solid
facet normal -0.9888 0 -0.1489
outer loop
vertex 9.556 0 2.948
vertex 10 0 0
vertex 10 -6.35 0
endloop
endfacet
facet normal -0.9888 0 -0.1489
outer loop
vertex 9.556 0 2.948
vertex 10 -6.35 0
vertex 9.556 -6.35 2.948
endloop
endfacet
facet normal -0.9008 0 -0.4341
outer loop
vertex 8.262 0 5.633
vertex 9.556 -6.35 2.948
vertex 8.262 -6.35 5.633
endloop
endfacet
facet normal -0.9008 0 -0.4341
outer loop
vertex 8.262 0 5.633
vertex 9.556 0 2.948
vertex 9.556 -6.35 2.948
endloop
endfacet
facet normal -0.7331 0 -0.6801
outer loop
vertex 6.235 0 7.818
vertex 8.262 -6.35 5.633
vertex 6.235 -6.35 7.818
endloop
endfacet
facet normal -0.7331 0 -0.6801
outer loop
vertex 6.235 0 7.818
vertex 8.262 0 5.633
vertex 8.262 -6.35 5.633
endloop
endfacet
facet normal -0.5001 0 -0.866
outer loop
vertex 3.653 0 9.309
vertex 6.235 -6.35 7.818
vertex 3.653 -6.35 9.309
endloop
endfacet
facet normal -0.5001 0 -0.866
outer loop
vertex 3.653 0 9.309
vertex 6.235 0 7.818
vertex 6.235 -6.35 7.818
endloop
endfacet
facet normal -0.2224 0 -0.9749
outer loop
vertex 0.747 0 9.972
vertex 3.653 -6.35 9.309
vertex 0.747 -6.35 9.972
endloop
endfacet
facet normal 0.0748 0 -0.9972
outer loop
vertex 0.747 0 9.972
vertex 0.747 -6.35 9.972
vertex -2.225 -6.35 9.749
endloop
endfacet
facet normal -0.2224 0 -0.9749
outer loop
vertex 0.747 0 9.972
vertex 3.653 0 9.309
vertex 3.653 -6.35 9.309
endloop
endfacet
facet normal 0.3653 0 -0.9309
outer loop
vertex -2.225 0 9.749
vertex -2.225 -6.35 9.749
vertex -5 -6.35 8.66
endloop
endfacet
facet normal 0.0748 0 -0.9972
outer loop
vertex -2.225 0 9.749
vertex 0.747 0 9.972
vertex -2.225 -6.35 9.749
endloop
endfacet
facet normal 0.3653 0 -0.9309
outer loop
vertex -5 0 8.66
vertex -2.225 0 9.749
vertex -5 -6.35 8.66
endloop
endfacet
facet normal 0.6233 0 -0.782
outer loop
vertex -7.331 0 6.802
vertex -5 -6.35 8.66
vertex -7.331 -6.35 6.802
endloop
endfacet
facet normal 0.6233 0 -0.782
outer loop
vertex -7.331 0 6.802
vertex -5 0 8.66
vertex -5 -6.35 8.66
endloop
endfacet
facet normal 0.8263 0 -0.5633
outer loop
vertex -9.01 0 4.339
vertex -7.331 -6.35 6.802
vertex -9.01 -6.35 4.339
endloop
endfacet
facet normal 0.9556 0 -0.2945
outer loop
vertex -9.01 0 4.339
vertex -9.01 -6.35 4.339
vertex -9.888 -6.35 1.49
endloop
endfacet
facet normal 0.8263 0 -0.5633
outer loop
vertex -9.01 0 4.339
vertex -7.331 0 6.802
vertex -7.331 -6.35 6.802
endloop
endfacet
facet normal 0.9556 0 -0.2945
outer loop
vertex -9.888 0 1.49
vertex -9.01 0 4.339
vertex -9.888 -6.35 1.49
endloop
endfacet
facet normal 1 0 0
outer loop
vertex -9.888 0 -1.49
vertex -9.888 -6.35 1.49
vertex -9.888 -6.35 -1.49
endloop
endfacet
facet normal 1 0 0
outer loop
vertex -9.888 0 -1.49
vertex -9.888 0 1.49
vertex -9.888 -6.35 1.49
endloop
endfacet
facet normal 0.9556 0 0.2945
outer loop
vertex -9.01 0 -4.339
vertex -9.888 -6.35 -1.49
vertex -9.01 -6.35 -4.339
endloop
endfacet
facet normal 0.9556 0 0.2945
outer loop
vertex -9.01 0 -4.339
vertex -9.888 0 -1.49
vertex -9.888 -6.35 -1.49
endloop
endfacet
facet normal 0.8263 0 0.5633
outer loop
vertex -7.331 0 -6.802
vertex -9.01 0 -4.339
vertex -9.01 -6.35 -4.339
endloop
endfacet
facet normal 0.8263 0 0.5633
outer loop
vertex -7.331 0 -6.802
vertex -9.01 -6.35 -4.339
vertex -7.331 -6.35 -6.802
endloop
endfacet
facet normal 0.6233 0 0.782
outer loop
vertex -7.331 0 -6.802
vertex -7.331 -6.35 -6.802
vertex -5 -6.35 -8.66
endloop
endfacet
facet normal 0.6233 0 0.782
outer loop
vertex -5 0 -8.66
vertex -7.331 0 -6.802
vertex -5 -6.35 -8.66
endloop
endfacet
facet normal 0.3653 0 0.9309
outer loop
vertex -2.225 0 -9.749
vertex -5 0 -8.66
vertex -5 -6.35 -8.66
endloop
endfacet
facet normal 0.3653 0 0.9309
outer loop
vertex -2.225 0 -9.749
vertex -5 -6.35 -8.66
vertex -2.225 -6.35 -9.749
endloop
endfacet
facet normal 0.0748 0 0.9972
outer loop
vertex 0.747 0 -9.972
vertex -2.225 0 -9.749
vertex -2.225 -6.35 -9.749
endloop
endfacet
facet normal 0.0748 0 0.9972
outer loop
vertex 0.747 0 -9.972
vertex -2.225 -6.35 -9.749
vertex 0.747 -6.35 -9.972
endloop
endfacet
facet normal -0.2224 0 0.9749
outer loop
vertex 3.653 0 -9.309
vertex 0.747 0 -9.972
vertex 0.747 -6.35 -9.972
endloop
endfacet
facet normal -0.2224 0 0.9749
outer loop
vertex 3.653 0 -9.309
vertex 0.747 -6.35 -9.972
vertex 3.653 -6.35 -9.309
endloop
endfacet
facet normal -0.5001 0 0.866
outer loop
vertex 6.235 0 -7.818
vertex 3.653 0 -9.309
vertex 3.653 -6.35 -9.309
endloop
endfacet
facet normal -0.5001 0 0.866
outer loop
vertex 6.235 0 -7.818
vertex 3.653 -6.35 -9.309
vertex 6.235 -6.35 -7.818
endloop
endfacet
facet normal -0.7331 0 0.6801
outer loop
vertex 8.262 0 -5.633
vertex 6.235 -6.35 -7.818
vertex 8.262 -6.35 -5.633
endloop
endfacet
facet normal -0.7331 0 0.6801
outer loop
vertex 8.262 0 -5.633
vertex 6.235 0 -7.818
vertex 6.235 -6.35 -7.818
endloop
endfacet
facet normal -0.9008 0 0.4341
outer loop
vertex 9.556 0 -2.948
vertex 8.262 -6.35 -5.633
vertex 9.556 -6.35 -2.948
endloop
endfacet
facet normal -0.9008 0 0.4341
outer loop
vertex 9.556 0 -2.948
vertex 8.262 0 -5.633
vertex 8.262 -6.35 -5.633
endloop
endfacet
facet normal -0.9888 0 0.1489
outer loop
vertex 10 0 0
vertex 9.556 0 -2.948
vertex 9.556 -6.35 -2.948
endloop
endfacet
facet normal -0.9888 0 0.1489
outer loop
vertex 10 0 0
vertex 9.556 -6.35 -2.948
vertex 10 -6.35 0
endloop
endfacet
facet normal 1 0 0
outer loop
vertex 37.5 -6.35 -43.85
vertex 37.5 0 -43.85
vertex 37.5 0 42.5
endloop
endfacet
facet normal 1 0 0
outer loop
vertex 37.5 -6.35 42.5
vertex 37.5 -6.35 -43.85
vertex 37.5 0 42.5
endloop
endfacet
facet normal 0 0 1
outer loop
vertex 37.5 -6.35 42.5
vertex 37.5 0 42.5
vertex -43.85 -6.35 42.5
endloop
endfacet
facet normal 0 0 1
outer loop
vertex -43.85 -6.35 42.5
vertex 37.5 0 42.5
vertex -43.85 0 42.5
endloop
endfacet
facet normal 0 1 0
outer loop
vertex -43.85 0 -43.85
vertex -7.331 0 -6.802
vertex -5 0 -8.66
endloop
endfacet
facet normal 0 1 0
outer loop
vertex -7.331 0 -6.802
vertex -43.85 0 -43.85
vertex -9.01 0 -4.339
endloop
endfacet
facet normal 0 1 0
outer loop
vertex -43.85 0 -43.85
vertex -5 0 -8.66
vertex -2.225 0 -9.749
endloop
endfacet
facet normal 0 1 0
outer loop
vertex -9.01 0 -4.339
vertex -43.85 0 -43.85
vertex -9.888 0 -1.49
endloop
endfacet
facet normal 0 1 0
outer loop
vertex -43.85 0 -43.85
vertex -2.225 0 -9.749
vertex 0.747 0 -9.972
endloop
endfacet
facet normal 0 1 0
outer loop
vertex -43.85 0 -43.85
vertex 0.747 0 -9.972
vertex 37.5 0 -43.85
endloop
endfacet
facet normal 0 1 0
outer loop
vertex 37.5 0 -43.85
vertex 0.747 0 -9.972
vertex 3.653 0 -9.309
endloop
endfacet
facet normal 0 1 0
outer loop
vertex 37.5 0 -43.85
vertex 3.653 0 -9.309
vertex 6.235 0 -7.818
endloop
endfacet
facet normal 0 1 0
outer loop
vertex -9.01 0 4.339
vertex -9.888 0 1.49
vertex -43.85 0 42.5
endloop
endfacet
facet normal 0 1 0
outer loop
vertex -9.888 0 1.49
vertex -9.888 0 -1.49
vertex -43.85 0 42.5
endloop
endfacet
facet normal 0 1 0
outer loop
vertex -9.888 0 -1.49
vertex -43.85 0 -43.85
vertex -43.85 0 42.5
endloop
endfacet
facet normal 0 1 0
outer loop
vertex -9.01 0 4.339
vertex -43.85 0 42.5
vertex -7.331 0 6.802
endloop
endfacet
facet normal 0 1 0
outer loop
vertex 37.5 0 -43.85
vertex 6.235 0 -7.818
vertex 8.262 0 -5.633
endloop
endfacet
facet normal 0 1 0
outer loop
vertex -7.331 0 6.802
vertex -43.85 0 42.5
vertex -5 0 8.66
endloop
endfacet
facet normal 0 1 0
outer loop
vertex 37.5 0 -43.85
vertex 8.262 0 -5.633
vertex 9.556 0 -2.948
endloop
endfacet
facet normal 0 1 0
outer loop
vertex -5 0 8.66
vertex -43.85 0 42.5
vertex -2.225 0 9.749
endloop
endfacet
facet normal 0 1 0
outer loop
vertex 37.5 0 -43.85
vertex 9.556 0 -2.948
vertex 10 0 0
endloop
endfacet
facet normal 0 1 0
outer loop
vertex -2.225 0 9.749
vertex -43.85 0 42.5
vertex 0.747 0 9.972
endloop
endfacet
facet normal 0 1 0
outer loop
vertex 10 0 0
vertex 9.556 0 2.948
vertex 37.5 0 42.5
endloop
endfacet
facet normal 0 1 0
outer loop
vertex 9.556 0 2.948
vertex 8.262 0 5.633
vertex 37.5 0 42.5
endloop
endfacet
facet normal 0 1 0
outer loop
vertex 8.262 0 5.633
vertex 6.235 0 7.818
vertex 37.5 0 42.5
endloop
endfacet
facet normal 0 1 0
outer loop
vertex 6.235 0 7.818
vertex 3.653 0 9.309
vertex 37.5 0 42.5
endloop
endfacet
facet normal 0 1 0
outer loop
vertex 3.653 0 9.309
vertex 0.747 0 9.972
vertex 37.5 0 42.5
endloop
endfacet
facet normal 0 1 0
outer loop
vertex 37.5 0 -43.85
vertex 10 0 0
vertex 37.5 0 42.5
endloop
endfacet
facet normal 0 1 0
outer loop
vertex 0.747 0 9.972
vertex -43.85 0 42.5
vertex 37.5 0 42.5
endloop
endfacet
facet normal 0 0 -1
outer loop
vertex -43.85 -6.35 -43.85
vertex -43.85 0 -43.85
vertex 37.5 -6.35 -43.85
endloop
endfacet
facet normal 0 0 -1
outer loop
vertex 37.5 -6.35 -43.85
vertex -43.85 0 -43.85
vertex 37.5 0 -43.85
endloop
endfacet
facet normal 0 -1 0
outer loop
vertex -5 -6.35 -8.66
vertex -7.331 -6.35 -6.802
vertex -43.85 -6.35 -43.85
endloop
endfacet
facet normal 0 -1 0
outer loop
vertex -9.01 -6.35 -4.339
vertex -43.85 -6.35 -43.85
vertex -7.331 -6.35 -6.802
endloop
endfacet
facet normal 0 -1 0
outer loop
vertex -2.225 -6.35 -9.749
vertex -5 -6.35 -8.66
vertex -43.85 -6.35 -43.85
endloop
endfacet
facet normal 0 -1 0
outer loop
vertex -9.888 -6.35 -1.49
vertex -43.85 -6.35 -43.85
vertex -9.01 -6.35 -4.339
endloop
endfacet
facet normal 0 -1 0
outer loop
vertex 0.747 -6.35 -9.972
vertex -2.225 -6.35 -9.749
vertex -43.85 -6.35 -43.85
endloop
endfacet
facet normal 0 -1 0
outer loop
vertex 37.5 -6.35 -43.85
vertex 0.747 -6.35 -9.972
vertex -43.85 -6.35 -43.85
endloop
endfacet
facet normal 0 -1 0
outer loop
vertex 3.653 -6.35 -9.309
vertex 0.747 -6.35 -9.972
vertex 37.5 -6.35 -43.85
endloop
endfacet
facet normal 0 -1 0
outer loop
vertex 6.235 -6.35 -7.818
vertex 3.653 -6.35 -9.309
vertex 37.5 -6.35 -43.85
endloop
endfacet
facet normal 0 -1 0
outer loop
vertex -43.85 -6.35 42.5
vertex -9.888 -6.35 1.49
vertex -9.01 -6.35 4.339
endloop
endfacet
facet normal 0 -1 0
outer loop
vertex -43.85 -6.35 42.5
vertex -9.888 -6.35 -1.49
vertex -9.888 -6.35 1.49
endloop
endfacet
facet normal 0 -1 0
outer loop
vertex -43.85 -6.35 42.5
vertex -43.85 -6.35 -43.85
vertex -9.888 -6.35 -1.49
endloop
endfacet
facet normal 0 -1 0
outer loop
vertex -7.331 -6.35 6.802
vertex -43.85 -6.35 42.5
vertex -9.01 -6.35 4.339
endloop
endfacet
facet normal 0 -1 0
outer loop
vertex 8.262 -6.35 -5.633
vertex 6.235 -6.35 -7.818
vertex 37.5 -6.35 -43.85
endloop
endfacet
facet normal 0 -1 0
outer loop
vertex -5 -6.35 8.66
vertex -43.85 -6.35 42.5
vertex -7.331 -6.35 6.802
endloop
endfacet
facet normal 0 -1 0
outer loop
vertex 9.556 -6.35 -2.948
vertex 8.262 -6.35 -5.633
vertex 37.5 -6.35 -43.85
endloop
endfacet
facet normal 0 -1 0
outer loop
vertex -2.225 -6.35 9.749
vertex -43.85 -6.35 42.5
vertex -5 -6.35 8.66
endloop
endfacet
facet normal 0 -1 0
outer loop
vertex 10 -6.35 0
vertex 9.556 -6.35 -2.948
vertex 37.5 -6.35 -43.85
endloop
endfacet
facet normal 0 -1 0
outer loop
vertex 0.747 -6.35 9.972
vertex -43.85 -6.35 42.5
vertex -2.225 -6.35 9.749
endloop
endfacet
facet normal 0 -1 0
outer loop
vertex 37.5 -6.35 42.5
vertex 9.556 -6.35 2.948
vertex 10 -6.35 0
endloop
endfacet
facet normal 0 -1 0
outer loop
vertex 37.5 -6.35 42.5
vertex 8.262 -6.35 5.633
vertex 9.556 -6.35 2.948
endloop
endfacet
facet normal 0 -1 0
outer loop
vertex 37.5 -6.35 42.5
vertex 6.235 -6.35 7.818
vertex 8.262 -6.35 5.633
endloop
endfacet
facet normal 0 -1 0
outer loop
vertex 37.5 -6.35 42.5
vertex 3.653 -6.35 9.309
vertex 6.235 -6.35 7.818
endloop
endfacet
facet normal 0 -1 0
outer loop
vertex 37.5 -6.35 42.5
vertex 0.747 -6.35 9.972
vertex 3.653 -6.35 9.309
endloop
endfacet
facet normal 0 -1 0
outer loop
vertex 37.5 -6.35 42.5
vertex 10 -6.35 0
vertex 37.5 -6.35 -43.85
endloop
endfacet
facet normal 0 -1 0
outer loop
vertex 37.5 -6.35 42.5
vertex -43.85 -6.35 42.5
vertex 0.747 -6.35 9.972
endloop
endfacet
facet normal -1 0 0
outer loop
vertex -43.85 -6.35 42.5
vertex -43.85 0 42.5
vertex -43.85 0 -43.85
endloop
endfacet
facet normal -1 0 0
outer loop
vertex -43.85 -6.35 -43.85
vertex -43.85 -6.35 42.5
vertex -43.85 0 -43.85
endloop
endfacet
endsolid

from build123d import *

# Parameters (mm, degrees)
F0_W     = 75
F0_H     = 75
F0_R     = 2.3876
F0_R_2   = 10
F0_W_2   = 6.35
F0_H_2   = 6.35
F1_DEPTH = 6.35


with BuildPart() as f1:
    # F0 (on Front) → F1 (new body)
    with BuildSketch(Plane.XZ):
        Rectangle(F0_W, F0_H)
        with Locations((0, -27.5)):
            Circle(F0_R, mode=Mode.SUBTRACT)
        Circle(F0_R_2, mode=Mode.SUBTRACT)
        with Locations((-40.675, 0)):
            Rectangle(F0_W_2, F0_H)
        with Locations((-40.675, -40.675)):
            Rectangle(F0_W_2, F0_H_2)
        with Locations((0, -40.675)):
            Rectangle(F0_W, F0_H_2)
        Polygon((-37.5, 37.5), (37.5, 37.5), (37.5, 42.5), (-43.85, 42.5), (-43.85, 37.5), align=None)
        with Locations((0, -27.5)):
            Circle(F0_R)
    extrude(amount=F1_DEPTH)


solid = f1.part
